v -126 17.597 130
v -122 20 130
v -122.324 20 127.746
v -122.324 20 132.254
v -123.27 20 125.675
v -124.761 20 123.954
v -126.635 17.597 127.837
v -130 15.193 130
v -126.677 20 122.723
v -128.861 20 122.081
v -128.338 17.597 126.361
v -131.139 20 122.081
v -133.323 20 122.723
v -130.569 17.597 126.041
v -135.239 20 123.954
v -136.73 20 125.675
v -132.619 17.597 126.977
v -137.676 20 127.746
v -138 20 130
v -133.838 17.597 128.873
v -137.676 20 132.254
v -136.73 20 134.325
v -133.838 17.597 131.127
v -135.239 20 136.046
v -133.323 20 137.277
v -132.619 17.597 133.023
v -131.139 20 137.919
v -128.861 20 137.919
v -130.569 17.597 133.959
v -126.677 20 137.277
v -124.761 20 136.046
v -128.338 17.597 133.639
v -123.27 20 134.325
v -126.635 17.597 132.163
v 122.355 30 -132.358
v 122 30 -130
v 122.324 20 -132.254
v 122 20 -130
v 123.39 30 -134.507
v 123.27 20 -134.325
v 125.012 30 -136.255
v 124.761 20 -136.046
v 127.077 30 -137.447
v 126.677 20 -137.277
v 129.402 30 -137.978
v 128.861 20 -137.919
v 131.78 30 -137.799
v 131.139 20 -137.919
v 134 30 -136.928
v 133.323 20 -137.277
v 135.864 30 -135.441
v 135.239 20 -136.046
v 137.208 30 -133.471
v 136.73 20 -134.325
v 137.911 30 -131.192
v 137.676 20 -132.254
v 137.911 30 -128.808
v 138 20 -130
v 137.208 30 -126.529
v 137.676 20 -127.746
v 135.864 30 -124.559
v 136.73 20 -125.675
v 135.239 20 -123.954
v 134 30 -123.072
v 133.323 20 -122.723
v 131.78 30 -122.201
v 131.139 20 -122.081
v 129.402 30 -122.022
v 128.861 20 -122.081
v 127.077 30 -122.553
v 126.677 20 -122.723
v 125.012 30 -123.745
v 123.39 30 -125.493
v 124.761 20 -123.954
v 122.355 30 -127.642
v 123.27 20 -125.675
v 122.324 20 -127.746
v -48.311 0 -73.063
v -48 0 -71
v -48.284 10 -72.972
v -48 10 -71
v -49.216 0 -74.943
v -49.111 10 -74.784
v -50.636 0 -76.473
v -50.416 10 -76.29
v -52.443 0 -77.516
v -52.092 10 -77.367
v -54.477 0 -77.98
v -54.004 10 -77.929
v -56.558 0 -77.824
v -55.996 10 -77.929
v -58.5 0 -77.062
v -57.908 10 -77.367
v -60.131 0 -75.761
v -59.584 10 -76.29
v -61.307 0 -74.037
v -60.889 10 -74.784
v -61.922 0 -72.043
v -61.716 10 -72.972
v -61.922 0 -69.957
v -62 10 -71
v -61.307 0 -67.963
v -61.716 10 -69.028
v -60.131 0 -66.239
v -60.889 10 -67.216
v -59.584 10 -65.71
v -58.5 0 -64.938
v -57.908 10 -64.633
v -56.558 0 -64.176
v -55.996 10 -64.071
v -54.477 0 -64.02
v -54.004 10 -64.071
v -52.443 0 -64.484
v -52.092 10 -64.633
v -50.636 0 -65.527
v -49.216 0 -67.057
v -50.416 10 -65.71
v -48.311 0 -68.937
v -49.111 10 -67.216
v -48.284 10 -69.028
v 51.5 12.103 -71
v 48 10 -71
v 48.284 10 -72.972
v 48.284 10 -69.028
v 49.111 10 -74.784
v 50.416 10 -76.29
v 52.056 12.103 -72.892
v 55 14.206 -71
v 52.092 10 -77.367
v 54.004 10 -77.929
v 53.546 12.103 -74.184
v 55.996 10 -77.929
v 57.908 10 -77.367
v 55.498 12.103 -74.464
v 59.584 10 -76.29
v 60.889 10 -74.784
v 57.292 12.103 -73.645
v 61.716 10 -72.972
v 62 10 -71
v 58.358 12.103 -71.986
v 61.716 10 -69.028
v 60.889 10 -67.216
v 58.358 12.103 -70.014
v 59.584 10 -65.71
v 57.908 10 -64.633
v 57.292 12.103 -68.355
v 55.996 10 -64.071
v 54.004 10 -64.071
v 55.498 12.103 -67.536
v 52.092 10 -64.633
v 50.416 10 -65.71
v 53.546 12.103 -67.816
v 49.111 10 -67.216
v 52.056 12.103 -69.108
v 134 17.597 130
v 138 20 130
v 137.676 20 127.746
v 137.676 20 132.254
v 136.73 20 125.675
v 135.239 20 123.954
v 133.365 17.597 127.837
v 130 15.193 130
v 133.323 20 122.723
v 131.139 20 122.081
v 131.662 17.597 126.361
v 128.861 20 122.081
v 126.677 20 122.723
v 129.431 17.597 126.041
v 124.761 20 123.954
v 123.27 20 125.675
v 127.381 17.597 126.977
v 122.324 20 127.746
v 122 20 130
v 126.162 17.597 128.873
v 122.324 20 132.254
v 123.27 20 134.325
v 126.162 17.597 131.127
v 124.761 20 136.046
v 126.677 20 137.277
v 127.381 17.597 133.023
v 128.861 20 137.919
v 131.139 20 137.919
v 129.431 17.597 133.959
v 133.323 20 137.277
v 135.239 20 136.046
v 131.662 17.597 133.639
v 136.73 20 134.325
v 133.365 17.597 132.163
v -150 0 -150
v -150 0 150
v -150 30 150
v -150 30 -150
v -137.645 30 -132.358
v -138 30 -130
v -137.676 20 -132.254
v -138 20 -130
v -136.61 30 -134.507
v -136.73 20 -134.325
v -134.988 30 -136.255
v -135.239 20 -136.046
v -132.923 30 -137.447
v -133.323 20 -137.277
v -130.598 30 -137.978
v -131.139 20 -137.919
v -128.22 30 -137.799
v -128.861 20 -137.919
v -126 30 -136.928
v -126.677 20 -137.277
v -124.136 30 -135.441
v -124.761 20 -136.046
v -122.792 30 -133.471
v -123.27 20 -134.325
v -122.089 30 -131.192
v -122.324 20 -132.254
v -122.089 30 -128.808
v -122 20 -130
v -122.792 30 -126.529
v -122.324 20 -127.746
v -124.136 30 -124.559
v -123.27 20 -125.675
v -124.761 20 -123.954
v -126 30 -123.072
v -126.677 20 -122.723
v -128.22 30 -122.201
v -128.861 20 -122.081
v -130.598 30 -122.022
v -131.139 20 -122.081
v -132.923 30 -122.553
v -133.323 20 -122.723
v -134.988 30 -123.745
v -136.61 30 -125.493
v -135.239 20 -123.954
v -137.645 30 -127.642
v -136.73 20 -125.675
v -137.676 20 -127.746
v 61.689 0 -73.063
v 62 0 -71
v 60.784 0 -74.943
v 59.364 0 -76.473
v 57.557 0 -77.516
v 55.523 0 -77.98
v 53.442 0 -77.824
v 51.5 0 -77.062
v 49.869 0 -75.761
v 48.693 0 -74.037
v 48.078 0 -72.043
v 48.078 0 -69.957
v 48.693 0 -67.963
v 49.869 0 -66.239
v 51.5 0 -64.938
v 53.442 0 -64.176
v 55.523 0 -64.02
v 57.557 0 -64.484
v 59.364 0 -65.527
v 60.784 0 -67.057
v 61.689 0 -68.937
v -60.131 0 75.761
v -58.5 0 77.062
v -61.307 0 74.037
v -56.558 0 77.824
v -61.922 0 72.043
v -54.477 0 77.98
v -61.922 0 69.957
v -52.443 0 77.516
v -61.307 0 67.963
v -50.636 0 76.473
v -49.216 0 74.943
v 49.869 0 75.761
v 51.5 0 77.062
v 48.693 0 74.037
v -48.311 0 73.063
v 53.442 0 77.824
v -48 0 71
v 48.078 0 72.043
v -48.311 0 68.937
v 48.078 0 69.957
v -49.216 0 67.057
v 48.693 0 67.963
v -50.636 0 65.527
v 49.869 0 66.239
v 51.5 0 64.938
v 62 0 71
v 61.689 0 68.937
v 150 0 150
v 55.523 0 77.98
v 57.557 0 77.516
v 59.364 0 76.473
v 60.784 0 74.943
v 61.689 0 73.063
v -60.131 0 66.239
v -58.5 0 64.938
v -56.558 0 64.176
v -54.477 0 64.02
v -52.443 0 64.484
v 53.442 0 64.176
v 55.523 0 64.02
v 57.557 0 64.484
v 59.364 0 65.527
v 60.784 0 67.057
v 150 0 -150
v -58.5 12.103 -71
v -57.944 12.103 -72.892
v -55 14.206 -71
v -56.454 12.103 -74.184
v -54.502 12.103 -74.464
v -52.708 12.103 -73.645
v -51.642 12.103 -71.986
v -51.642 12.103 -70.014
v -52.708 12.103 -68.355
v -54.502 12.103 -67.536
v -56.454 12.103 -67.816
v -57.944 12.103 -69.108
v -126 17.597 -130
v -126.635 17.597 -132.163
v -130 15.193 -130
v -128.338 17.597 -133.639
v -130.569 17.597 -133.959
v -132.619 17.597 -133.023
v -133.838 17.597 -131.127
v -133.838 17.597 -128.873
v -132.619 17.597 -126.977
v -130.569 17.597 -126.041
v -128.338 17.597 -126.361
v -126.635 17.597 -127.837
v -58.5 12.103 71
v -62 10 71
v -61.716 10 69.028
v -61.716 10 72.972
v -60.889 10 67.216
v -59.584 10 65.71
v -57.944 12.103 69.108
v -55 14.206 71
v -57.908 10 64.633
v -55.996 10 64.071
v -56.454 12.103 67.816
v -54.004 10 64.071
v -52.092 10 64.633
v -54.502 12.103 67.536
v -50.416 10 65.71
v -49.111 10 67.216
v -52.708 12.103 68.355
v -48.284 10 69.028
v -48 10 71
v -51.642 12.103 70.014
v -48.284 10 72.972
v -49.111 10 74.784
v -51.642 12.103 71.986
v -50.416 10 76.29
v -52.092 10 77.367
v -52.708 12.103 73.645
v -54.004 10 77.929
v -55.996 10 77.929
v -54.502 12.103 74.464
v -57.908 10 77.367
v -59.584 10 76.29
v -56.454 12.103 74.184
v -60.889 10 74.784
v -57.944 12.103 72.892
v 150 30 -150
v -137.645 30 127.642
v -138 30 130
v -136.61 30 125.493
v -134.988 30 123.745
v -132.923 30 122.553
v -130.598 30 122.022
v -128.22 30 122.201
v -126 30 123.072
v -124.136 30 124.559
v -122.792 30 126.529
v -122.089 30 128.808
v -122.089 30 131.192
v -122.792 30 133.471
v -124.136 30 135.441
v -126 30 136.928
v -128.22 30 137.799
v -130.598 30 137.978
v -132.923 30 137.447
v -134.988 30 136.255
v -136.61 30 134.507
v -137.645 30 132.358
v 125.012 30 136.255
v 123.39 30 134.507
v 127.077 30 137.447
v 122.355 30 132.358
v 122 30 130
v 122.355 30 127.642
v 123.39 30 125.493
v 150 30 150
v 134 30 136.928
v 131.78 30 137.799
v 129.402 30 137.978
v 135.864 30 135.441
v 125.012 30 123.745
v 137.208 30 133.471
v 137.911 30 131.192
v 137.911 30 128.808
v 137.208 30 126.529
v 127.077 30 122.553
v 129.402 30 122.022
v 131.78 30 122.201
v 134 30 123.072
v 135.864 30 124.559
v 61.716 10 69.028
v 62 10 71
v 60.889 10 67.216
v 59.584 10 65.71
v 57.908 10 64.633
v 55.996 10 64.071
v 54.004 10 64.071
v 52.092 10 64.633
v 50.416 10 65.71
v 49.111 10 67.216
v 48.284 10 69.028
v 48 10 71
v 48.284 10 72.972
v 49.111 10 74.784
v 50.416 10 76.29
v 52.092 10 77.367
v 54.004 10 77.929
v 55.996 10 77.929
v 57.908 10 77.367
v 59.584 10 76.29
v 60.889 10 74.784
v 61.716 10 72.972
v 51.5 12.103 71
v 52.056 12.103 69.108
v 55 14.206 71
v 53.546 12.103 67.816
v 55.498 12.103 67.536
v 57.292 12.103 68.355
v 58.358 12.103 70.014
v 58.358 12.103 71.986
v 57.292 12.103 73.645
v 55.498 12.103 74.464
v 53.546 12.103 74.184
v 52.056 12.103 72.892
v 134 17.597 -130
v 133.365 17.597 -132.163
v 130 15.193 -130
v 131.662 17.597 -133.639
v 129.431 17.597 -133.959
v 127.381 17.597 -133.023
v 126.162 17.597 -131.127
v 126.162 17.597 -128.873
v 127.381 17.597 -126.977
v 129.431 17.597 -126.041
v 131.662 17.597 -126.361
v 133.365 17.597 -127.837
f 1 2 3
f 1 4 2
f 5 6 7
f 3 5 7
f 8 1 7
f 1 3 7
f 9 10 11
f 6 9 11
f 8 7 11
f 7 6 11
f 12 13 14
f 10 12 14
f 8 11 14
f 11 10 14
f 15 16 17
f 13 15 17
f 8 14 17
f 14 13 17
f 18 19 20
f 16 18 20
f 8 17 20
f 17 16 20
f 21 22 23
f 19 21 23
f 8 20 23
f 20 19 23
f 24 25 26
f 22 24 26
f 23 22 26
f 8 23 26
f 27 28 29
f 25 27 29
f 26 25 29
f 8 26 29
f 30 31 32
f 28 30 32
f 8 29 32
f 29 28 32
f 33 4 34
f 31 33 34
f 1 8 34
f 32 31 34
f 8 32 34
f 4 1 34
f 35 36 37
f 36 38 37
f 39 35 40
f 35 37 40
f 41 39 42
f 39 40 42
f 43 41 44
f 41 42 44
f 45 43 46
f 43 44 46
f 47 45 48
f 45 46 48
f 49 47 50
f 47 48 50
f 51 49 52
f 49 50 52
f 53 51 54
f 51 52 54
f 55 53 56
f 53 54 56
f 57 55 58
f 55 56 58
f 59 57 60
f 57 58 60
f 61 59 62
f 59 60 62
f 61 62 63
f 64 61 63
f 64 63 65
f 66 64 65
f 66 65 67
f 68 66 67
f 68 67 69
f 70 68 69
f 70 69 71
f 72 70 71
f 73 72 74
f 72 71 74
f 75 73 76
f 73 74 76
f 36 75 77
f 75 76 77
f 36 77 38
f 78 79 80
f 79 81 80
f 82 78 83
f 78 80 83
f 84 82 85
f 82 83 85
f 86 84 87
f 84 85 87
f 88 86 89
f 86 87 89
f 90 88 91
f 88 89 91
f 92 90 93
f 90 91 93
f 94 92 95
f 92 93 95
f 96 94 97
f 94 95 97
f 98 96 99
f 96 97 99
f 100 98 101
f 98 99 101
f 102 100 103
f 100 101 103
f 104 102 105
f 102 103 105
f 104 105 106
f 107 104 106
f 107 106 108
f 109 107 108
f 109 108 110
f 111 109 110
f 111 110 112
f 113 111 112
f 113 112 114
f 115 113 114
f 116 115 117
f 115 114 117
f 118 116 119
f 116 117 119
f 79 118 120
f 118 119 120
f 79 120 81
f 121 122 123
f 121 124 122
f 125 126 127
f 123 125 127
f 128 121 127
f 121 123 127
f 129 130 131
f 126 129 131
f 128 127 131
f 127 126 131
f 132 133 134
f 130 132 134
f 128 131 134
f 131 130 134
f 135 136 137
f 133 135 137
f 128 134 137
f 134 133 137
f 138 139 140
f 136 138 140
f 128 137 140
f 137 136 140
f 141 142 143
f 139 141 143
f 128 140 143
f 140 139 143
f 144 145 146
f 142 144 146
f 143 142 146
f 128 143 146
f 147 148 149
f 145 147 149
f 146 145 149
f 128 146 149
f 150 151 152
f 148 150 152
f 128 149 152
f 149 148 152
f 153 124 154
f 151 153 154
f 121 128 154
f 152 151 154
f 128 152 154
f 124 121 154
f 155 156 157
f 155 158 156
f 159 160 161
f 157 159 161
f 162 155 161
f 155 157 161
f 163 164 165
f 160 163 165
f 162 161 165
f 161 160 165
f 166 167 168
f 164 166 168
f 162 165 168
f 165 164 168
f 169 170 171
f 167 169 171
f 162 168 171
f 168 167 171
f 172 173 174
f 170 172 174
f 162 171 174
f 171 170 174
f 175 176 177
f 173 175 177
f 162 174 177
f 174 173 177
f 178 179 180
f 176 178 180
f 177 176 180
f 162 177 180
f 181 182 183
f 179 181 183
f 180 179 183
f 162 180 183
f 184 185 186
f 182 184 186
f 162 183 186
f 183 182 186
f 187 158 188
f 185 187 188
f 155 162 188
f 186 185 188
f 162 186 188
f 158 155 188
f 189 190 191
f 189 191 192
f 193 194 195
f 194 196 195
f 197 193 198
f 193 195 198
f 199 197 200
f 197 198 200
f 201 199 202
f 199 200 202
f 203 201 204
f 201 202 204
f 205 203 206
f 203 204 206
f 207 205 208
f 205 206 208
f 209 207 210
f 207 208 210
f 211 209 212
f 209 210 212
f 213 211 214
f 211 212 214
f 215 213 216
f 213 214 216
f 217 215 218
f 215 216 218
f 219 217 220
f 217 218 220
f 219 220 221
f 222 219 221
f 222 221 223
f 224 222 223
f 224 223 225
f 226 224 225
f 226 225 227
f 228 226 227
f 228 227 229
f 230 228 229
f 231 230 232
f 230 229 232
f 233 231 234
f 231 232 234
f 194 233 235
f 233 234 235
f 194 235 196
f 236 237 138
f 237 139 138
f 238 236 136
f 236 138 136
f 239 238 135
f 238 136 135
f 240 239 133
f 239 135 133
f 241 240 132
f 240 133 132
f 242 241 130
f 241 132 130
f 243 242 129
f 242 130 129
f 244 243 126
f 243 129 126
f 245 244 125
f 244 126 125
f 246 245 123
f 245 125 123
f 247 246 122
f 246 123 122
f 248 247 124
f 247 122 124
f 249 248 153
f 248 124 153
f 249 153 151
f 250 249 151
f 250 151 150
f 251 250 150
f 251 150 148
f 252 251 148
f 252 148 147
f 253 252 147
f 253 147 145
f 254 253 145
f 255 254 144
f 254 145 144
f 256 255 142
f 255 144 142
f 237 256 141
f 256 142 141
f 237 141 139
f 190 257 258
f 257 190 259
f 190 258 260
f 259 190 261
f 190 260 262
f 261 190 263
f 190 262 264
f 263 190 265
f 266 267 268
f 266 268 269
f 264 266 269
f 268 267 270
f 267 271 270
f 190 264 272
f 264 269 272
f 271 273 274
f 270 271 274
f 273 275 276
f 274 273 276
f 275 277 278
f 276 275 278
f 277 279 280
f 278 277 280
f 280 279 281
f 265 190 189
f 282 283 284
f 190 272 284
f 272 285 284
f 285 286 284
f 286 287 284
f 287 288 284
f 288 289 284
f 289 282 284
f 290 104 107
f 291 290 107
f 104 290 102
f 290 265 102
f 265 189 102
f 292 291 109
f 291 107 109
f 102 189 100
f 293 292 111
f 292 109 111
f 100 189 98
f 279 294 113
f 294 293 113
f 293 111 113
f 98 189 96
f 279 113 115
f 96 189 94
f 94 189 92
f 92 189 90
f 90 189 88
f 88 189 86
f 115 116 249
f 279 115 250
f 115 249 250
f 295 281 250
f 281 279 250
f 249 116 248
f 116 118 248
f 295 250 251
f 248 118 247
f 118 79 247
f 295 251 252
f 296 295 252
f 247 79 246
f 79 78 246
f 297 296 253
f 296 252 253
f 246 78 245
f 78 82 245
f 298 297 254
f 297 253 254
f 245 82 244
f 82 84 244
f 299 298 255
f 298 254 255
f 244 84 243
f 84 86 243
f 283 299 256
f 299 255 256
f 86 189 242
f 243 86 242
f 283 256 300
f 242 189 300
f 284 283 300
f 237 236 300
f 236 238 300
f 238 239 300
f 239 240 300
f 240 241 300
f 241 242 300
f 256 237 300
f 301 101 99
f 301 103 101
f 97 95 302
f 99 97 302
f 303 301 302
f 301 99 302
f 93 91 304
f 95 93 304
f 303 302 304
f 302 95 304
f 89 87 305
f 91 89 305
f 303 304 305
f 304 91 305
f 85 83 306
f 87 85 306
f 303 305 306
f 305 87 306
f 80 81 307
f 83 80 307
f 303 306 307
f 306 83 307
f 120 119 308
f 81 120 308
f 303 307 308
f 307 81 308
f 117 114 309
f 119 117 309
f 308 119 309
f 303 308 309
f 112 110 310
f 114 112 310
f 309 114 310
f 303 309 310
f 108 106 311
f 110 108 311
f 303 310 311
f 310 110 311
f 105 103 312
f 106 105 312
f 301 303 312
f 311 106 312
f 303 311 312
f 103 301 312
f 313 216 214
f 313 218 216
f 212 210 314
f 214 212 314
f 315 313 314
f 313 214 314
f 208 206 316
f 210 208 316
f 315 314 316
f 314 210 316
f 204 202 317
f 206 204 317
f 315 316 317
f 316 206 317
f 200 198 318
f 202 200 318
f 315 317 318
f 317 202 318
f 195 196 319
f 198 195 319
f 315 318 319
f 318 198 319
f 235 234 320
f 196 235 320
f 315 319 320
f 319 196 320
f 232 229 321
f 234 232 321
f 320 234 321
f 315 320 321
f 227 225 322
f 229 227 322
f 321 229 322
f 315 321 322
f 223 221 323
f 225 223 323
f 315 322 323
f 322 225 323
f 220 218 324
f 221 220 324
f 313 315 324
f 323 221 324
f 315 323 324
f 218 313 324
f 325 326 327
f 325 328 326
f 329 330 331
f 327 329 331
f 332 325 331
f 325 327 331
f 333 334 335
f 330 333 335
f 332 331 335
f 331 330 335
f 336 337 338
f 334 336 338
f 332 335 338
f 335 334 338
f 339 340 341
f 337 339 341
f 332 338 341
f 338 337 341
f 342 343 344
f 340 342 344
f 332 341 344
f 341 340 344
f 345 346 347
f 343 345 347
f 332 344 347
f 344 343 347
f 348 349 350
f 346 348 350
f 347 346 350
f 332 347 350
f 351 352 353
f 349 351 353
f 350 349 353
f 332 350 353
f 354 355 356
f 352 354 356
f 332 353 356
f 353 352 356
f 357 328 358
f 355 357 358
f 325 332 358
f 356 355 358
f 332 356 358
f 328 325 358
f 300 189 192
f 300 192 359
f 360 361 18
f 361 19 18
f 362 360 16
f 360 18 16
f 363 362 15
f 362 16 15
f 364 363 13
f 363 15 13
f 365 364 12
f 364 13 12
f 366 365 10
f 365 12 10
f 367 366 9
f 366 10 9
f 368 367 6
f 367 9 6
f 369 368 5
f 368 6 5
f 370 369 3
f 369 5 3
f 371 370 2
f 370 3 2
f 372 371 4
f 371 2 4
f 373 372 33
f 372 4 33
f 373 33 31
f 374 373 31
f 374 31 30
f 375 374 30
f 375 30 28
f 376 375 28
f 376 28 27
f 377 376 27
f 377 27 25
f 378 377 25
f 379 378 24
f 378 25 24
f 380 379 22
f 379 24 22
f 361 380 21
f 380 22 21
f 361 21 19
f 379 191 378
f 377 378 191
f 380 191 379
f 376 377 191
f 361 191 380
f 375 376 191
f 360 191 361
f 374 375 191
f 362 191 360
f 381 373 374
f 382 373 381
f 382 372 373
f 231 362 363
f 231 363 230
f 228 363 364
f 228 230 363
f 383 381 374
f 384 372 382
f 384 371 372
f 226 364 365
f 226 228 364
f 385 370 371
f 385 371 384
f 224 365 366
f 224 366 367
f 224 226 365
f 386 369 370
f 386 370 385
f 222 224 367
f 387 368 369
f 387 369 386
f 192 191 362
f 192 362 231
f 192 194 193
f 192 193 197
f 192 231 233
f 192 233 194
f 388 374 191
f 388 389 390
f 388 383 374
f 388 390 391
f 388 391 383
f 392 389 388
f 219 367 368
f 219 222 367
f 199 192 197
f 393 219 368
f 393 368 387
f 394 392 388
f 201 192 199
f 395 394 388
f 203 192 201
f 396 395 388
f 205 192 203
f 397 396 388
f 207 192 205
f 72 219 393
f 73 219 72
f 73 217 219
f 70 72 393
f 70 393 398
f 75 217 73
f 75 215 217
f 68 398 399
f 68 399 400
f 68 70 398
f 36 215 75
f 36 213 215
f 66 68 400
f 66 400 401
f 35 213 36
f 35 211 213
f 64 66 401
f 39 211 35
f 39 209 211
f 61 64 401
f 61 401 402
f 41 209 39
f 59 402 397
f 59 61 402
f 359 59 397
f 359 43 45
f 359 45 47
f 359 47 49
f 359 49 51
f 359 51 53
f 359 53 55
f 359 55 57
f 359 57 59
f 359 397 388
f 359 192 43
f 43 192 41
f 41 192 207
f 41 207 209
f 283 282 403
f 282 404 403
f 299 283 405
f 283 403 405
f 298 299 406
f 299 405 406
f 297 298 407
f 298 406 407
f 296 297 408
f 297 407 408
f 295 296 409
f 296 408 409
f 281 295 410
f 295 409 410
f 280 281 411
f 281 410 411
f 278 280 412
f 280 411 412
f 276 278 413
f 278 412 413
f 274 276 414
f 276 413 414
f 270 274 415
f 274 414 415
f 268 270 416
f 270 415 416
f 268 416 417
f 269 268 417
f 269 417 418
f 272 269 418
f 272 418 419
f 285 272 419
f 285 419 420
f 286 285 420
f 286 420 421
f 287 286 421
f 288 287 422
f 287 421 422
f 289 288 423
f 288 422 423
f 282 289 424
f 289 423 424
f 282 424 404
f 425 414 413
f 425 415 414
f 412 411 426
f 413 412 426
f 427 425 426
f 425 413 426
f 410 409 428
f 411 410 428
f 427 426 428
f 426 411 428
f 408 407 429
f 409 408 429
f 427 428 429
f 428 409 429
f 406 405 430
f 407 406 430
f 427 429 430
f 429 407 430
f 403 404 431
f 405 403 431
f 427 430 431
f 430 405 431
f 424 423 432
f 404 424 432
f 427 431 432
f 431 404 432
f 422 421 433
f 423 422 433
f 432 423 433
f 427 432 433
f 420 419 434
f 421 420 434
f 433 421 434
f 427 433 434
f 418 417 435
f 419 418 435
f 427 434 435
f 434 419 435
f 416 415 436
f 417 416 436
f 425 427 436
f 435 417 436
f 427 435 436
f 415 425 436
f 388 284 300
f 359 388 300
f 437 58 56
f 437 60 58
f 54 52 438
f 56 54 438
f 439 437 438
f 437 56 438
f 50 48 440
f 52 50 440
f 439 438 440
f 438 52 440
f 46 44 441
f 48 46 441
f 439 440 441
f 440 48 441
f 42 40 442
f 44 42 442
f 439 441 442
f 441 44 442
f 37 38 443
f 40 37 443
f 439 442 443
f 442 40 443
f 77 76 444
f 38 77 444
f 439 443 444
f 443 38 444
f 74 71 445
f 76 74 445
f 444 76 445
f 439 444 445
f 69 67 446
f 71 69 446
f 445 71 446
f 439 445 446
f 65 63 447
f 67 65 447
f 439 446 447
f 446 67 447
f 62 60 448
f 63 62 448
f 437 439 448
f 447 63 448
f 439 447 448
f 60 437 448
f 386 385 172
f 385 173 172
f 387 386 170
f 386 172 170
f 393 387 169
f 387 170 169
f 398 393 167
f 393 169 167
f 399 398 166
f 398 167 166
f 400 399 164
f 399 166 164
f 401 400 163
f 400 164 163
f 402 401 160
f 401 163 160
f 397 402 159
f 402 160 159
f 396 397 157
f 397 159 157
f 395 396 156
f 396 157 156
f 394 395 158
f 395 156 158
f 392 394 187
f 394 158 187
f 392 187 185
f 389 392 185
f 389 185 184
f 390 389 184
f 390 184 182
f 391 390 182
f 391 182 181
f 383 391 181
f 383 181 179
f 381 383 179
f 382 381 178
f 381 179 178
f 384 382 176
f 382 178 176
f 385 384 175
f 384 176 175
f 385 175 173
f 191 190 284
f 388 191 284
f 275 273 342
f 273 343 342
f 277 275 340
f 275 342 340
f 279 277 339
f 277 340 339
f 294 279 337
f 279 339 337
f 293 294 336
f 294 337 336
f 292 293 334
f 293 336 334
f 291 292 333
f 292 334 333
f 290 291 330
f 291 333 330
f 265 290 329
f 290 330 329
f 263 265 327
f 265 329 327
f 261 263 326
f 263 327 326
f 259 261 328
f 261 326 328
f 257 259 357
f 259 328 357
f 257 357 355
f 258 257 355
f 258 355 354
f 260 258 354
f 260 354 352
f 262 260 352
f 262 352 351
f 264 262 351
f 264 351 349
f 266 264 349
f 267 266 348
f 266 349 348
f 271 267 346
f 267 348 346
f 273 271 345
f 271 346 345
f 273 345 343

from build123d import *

# Parameters (mm, degrees)
ESBO_O1_W                      = 300
ESBO_O1_H                      = 300
RESSALTO_EXTRUS_O1_DEPTH       = 30
FURO_ROSCADO_DE_M16X2_01_D     = 14
FURO_ROSCADO_DE_M16X2_01_DEPTH = 10
FURO_ROSCADO_DE_M16X2_01_TIP   = 4.206024333
FURO_ROSCADO_DE_M18X2_02_D     = 16
FURO_ROSCADO_DE_M18X2_02_DEPTH = 10
FURO_ROSCADO_DE_M18X2_02_TIP   = 4.806884952


with BuildPart() as part:
    # Esboço1 → Ressalto-extrusão1 (new body)
    with BuildSketch(Plane(origin=(0, 0, 0), x_dir=(1, 0, 0), z_dir=(0, 1, 0))):
        Rectangle(ESBO_O1_W, ESBO_O1_H)
    extrude(amount=RESSALTO_EXTRUS_O1_DEPTH)

    # Furo roscado de M16x2.01
    with Locations(Plane(origin=(0, 0, 0), x_dir=(-1, 0, 0), z_dir=(0, -1, 0))):
        with Locations((55, -71), (-55, -71), (-55, 71), (55, 71)):
            Hole(FURO_ROSCADO_DE_M16X2_01_D / 2, depth=FURO_ROSCADO_DE_M16X2_01_DEPTH)
            with Locations((0, 0, -(FURO_ROSCADO_DE_M16X2_01_DEPTH + FURO_ROSCADO_DE_M16X2_01_TIP / 2))):  # 118° drill point
                Cone(0, FURO_ROSCADO_DE_M16X2_01_D / 2, FURO_ROSCADO_DE_M16X2_01_TIP, mode=Mode.SUBTRACT)

    # Furo roscado de M18x2.02
    with Locations(Plane(origin=(0, 30, 0), x_dir=(1, 0, 0), z_dir=(0, 1, 0))):
        with Locations((-130, 130), (130, 130), (130, -130), (-130, -130)):
            Hole(FURO_ROSCADO_DE_M18X2_02_D / 2, depth=FURO_ROSCADO_DE_M18X2_02_DEPTH)
            with Locations((0, 0, -(FURO_ROSCADO_DE_M18X2_02_DEPTH + FURO_ROSCADO_DE_M18X2_02_TIP / 2))):  # 118° drill point
                Cone(0, FURO_ROSCADO_DE_M18X2_02_D / 2, FURO_ROSCADO_DE_M18X2_02_TIP, mode=Mode.SUBTRACT)


solid = part.part
